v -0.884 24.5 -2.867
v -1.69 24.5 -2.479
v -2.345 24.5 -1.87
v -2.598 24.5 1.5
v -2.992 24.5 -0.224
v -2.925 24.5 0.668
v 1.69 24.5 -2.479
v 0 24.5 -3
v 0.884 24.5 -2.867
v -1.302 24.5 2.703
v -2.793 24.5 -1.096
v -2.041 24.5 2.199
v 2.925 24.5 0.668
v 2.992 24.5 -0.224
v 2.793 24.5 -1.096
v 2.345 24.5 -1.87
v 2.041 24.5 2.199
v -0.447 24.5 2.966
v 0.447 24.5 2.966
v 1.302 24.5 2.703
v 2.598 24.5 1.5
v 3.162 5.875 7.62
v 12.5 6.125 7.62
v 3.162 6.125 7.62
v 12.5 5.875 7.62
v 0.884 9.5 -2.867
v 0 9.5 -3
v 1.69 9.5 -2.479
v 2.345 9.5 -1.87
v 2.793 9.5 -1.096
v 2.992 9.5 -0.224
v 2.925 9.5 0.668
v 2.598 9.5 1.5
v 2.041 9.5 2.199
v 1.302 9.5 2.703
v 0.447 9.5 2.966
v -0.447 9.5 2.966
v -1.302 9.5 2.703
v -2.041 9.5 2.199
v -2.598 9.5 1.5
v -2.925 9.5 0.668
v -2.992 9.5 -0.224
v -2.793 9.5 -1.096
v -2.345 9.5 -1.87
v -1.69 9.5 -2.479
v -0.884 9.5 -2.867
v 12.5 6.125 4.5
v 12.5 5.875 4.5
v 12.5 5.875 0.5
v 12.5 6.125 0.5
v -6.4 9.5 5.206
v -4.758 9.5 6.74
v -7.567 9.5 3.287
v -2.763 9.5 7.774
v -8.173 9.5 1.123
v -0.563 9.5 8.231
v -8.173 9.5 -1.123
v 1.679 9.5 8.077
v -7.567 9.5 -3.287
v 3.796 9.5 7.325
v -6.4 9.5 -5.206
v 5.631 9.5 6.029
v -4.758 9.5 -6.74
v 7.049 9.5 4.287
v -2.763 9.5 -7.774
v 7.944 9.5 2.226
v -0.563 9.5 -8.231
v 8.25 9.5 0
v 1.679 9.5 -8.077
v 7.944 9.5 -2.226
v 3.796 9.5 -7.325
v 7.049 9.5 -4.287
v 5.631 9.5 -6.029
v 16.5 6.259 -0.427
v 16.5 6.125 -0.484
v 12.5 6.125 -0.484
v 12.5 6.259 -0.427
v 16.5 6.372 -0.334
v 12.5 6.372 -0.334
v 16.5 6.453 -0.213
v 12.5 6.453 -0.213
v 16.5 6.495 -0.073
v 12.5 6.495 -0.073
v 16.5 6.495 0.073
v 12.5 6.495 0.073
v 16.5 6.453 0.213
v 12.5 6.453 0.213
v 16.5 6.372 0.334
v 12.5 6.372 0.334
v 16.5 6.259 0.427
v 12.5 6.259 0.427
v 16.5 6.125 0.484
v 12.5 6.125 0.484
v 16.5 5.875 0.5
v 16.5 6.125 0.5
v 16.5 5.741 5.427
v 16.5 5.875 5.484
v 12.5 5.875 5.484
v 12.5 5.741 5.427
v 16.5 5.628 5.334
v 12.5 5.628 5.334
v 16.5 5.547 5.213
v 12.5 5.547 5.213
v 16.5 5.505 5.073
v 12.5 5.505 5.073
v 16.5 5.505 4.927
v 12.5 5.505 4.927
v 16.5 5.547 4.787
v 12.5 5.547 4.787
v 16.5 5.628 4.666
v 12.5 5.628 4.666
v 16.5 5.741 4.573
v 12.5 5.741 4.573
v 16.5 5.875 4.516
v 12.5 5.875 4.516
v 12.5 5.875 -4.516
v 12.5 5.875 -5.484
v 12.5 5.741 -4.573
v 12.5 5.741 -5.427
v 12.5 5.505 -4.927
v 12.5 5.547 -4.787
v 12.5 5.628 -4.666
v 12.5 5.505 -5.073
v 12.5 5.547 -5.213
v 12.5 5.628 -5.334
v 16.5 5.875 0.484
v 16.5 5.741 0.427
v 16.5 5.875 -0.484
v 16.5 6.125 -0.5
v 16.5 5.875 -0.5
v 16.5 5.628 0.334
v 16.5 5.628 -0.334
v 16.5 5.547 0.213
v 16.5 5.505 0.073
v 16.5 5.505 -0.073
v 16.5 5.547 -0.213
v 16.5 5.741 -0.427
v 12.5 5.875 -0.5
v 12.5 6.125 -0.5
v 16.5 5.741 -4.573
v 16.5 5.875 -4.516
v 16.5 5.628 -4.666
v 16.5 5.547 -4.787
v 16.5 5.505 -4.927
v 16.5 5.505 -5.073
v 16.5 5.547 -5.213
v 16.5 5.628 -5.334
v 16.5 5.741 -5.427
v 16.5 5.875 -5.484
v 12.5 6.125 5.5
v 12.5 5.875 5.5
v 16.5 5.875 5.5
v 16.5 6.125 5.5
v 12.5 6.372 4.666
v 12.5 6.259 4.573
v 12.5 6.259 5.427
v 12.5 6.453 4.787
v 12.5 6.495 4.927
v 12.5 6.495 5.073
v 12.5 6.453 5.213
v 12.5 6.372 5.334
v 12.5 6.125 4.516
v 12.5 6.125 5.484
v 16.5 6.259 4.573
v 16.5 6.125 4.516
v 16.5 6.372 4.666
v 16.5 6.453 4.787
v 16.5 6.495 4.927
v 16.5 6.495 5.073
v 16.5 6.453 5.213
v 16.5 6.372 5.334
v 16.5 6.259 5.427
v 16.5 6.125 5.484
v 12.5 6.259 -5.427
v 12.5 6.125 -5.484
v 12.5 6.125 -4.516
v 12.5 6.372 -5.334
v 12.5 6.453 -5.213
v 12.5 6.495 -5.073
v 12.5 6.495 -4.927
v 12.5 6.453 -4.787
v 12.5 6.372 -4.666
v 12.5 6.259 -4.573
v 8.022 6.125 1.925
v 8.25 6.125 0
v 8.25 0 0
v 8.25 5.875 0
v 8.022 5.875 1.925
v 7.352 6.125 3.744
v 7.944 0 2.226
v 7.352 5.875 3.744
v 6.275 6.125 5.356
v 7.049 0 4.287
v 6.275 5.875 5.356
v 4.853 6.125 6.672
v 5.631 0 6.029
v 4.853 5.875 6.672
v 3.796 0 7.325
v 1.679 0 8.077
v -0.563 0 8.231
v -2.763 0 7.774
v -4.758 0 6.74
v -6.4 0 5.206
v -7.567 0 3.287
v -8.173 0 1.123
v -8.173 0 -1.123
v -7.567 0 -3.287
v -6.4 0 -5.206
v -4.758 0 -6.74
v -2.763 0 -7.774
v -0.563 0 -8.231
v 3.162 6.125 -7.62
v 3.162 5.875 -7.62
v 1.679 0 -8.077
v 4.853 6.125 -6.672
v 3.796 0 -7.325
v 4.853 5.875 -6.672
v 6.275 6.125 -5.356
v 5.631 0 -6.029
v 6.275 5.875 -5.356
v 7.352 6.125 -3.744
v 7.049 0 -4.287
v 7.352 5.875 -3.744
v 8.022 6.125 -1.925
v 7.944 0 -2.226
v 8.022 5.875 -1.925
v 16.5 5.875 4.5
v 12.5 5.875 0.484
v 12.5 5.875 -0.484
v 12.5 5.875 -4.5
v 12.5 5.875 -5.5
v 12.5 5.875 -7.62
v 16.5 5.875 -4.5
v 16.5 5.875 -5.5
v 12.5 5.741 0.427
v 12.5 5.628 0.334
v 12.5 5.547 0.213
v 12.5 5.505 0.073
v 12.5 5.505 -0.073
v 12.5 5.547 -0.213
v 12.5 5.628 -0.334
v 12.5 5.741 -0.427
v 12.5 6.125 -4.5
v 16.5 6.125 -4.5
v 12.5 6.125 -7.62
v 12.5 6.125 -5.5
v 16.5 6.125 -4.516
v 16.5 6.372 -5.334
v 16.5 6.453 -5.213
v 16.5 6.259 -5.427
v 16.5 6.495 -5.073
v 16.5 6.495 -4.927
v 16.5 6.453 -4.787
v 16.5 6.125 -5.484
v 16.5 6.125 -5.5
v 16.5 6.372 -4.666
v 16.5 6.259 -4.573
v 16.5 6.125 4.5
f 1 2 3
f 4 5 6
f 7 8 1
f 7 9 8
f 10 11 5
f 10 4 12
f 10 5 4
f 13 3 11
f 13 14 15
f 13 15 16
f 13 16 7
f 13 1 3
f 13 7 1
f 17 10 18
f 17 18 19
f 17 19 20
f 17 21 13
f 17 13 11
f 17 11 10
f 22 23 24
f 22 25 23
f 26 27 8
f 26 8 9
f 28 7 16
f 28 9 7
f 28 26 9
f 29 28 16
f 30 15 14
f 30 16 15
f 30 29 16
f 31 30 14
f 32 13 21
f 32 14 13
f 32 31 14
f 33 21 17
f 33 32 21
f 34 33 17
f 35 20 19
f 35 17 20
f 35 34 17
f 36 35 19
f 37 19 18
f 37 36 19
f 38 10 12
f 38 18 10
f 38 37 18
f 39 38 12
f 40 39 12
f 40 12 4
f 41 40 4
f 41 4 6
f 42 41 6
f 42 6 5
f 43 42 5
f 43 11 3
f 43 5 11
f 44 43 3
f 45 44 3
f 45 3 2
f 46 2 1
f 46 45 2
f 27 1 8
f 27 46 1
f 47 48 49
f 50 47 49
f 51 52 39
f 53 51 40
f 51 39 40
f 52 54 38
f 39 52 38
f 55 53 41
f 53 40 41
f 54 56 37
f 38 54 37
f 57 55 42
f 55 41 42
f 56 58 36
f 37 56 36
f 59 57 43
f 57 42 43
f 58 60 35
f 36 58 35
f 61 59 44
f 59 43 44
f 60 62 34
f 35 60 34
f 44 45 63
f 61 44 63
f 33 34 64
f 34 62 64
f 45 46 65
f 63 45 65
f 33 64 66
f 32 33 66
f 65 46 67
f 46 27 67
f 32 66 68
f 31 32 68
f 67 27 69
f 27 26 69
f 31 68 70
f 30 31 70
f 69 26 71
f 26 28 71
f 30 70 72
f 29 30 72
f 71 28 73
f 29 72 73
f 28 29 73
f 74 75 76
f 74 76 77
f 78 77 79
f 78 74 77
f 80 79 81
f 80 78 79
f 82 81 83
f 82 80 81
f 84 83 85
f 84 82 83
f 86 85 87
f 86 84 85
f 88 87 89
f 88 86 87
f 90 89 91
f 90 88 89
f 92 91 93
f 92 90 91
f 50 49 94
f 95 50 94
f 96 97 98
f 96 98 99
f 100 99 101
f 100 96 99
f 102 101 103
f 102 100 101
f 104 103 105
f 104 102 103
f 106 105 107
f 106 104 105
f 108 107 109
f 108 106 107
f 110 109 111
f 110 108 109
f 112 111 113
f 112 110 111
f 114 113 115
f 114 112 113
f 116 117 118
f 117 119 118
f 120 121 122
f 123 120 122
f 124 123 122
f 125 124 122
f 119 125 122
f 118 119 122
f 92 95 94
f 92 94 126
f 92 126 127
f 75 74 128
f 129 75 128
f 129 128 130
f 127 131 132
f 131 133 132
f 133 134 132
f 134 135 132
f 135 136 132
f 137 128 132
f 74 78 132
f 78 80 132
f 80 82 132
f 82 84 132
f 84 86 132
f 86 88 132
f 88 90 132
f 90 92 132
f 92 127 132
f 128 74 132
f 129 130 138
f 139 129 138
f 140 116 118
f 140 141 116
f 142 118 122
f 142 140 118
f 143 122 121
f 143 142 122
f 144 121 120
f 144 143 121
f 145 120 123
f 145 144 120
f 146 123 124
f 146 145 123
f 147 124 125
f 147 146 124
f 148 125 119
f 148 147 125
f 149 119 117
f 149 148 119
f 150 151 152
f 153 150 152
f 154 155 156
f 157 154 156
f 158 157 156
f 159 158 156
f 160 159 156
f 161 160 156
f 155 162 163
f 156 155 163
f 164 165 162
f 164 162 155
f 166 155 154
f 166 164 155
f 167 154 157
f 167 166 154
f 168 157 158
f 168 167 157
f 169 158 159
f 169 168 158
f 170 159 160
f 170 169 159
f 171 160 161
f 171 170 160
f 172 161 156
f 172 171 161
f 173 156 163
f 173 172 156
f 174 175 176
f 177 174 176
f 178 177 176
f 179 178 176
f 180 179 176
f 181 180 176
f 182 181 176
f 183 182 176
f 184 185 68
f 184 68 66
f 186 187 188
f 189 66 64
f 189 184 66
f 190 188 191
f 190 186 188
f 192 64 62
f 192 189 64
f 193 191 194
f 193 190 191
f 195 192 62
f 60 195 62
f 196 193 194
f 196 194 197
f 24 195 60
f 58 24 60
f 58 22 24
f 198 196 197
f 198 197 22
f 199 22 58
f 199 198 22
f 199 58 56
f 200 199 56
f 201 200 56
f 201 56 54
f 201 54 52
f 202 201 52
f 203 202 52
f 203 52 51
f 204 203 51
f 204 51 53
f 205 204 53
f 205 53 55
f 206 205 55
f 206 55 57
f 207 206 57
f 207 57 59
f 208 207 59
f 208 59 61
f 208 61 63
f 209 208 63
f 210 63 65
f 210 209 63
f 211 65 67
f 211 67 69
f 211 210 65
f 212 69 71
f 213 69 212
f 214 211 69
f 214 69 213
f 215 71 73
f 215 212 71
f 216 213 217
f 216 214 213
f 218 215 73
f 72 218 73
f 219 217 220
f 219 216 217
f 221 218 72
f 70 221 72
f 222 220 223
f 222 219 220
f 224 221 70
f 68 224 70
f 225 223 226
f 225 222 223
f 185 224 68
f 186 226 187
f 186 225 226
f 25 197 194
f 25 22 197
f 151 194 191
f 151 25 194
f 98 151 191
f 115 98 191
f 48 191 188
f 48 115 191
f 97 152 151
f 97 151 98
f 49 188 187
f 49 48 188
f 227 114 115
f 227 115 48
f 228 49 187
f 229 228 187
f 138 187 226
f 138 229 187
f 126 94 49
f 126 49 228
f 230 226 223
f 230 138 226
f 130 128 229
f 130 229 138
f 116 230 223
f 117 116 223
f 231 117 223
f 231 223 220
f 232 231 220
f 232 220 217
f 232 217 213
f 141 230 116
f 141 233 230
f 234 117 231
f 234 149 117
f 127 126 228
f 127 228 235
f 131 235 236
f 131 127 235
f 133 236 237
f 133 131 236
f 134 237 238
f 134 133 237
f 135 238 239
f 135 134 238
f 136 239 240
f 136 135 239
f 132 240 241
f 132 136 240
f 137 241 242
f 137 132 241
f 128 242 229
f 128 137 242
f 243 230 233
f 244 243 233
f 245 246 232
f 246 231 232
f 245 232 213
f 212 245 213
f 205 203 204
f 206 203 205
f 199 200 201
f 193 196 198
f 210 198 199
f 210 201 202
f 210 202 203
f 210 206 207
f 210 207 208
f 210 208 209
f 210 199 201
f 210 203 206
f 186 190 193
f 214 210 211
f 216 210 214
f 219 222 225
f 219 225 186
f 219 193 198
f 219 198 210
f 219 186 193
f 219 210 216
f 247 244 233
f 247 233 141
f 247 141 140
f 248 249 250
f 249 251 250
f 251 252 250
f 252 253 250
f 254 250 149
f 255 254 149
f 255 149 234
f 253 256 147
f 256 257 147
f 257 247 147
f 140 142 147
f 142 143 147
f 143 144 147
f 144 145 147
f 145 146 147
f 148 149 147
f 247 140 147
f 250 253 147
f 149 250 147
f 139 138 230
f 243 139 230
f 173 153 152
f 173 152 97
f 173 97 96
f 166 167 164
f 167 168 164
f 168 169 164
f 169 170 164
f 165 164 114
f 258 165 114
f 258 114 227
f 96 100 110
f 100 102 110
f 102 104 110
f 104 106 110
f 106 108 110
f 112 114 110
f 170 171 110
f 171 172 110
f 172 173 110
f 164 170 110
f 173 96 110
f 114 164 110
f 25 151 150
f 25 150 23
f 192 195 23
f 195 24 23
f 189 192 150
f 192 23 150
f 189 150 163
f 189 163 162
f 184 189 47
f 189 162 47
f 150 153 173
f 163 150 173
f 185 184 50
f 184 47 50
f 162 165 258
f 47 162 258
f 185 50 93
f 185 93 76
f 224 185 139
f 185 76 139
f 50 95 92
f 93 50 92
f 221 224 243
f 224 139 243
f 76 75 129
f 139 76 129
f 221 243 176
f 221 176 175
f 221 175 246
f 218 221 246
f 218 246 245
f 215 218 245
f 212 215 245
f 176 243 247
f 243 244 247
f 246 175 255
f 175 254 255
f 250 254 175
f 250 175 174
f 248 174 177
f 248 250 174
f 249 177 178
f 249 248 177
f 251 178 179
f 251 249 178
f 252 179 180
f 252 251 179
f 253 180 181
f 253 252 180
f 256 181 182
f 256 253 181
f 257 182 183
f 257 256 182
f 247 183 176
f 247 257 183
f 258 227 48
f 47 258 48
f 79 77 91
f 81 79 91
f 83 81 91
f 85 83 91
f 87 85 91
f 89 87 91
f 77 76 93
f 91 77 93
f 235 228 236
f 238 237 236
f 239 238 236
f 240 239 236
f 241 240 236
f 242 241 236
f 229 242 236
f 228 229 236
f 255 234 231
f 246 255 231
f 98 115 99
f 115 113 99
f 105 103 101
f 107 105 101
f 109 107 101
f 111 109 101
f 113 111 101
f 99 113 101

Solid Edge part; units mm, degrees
sketch "Sketch1" plane through (0, 0, 0) normal (0, -1, 0) x (1, 0, 0)
  circle A0 centre (0, 0) radius 8.25
extrude "Protrusion1" add sketch "Sketch1" against normal blind 9.5
sketch "Sketch2" plane through (0, 9.5, 0) normal (0, 1, 0) x (0, 0, -1)
  circle A0 centre (0, 0) radius 3
extrude "ExtrudedProtrusion_2" add sketch "Sketch2" along normal blind 15
sketch "Sketch3" plane through (0, 6, 0) normal (0, 1, 0) x (0, 0, -1)
  line L0 (-7.62, -12.5) -> (-7.62, -3.162)
  line L1 (7.62, -3.162) -> (-7.62, -3.162)
  line L2 (7.62, -12.5) -> (7.62, -3.162)
  line L3 (5.5, -12.5) -> (7.62, -12.5)
  line L4 (5.5, -16.5) -> (5.5, -12.5)
  line L5 (4.5, -16.5) -> (5.5, -16.5)
  line L6 (4.5, -12.5) -> (4.5, -16.5)
  line L7 (0.5, -12.5) -> (4.5, -12.5)
  line L8 (0.5, -16.5) -> (0.5, -12.5)
  line L9 (-0.5, -16.5) -> (0.5, -16.5)
  line L10 (-0.5, -12.5) -> (-0.5, -16.5)
  line L11 (-4.5, -12.5) -> (-0.5, -12.5)
  line L12 (-4.5, -16.5) -> (-4.5, -12.5)
  line L13 (-5.5, -16.5) -> (-4.5, -16.5)
  line L14 (-5.5, -12.5) -> (-5.5, -16.5)
  line L15 (-5.5, -12.5) -> (-7.62, -12.5)
extrude "ExtrudedProtrusion_3" add sketch "Sketch3" along normal mid plane 0.25
sketch "Sketch4" plane through (16.5, 6, 5) normal (1, 0, 0) x (0, 0, -1)
  circle A0 centre (0, 0) radius 0.5
  circle A1 centre (5, 0) radius 0.5
  circle A2 centre (10, 0) radius 0.5
  dimension "D1" = 1
extrude "Protrusion2" add sketch "Sketch4" against normal up to vertex (4 mm away)
